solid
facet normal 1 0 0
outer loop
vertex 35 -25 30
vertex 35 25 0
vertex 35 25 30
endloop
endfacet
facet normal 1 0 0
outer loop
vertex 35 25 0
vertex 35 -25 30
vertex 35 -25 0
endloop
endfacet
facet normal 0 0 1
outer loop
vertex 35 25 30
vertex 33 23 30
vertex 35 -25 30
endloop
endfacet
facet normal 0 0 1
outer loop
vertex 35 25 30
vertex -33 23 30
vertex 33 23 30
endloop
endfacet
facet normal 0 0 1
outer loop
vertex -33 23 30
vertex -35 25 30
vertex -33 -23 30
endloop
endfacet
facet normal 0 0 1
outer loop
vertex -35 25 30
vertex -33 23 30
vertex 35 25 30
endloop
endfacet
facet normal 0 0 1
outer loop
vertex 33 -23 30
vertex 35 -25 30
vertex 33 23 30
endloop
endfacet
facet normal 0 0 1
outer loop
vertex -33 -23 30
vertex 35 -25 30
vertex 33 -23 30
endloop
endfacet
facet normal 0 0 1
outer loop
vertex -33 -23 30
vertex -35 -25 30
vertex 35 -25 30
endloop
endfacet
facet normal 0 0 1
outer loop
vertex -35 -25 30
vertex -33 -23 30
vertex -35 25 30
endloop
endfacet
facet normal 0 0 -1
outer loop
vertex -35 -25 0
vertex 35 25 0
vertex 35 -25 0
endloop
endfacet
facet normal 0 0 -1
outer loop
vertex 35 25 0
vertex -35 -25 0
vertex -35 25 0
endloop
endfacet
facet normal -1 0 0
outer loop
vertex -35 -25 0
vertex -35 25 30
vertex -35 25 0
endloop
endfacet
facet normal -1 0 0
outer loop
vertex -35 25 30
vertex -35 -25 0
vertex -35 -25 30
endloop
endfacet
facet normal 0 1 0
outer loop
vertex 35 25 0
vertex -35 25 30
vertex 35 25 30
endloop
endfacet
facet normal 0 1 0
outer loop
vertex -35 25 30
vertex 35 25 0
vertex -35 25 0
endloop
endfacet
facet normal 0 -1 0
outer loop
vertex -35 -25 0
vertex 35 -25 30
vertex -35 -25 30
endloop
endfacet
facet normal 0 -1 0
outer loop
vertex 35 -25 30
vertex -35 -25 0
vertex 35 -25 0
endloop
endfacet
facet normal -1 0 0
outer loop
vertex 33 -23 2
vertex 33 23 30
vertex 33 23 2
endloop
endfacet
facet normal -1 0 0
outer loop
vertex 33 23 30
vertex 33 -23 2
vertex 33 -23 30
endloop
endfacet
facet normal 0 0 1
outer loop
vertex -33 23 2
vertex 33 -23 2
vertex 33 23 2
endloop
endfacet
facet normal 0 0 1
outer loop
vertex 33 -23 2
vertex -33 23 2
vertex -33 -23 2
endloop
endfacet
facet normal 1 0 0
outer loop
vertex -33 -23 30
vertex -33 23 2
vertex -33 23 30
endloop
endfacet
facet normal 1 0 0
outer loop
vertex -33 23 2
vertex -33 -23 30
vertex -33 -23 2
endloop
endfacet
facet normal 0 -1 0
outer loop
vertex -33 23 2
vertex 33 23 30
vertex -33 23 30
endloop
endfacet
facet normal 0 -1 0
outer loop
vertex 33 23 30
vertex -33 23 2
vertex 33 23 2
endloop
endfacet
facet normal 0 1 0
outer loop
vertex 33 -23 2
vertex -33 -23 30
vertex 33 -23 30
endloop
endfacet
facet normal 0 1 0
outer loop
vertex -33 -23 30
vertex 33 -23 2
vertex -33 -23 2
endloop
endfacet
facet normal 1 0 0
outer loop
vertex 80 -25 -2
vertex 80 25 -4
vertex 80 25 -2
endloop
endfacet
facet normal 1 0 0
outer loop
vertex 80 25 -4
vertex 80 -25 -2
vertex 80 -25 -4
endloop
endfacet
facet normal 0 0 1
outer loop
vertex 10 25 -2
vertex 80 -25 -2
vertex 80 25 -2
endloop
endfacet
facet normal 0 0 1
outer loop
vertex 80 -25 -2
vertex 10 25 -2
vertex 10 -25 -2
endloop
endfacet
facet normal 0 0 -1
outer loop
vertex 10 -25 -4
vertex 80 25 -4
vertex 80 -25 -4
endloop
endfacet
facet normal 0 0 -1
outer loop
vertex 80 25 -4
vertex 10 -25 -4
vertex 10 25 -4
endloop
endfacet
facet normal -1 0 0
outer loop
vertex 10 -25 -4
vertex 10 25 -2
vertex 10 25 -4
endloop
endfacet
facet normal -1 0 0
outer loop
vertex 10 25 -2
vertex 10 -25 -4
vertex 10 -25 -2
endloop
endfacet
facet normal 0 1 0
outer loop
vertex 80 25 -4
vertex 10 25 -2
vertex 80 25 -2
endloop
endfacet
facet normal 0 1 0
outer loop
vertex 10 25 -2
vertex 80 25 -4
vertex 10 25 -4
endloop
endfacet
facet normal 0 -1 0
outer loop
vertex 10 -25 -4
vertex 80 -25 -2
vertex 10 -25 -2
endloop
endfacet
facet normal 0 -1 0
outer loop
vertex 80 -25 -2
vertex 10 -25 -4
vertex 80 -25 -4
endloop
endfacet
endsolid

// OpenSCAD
// Two-part enclosure for small electronics board
// Print orientation: both parts on the bed, lid on +X side of box

// ---- Box ----
box_x = 70;      // outer length (X)
box_y = 50;      // outer width (Y)
box_z = 30;      // outer height (Z)
wall = 2;        // wall thickness
floor = 2;       // floor thickness

// ---- Lid ----
lip_w = 65.6;    // lip outer length (X)
lip_d = 45.6;    // lip outer width (Y)
lip_h = 4;       // lip height (Z)
lip_t = 1.5;     // lip wall thickness

// ---- Misc ----
eps = 0.5;       // cutter overshoot
gap = 10;        // gap between parts

$fn = 64;

// Derived
inner_x = box_x - 2 * wall;
inner_y = box_y - 2 * wall;
lip_d2  = lip_d + 2 * wall;   // lip outer width includes side walls

module box() {
    difference() {
        translate([-box_x / 2, -box_y / 2, 0])
            cube([box_x, box_y, box_z]);
        translate([-inner_x / 2, -inner_y / 2, floor])
            cube([inner_x, inner_y, box_z - floor + eps]); // open top
    }
}

module lid() {
    translate([0, 0, -lip_h])
        union() {
            // plate
            translate([-box_x / 2, -box_y / 2, 0])
                cube([box_x, box_y, 2]);
            // lip
            translate([-lip_w / 2, -lip_d2 / 2, 0])
                cube([lip_w, lip_d2, lip_t]);
        }
}

box();
translate([box_x / 2 + gap, 0, 0])
    lid();
